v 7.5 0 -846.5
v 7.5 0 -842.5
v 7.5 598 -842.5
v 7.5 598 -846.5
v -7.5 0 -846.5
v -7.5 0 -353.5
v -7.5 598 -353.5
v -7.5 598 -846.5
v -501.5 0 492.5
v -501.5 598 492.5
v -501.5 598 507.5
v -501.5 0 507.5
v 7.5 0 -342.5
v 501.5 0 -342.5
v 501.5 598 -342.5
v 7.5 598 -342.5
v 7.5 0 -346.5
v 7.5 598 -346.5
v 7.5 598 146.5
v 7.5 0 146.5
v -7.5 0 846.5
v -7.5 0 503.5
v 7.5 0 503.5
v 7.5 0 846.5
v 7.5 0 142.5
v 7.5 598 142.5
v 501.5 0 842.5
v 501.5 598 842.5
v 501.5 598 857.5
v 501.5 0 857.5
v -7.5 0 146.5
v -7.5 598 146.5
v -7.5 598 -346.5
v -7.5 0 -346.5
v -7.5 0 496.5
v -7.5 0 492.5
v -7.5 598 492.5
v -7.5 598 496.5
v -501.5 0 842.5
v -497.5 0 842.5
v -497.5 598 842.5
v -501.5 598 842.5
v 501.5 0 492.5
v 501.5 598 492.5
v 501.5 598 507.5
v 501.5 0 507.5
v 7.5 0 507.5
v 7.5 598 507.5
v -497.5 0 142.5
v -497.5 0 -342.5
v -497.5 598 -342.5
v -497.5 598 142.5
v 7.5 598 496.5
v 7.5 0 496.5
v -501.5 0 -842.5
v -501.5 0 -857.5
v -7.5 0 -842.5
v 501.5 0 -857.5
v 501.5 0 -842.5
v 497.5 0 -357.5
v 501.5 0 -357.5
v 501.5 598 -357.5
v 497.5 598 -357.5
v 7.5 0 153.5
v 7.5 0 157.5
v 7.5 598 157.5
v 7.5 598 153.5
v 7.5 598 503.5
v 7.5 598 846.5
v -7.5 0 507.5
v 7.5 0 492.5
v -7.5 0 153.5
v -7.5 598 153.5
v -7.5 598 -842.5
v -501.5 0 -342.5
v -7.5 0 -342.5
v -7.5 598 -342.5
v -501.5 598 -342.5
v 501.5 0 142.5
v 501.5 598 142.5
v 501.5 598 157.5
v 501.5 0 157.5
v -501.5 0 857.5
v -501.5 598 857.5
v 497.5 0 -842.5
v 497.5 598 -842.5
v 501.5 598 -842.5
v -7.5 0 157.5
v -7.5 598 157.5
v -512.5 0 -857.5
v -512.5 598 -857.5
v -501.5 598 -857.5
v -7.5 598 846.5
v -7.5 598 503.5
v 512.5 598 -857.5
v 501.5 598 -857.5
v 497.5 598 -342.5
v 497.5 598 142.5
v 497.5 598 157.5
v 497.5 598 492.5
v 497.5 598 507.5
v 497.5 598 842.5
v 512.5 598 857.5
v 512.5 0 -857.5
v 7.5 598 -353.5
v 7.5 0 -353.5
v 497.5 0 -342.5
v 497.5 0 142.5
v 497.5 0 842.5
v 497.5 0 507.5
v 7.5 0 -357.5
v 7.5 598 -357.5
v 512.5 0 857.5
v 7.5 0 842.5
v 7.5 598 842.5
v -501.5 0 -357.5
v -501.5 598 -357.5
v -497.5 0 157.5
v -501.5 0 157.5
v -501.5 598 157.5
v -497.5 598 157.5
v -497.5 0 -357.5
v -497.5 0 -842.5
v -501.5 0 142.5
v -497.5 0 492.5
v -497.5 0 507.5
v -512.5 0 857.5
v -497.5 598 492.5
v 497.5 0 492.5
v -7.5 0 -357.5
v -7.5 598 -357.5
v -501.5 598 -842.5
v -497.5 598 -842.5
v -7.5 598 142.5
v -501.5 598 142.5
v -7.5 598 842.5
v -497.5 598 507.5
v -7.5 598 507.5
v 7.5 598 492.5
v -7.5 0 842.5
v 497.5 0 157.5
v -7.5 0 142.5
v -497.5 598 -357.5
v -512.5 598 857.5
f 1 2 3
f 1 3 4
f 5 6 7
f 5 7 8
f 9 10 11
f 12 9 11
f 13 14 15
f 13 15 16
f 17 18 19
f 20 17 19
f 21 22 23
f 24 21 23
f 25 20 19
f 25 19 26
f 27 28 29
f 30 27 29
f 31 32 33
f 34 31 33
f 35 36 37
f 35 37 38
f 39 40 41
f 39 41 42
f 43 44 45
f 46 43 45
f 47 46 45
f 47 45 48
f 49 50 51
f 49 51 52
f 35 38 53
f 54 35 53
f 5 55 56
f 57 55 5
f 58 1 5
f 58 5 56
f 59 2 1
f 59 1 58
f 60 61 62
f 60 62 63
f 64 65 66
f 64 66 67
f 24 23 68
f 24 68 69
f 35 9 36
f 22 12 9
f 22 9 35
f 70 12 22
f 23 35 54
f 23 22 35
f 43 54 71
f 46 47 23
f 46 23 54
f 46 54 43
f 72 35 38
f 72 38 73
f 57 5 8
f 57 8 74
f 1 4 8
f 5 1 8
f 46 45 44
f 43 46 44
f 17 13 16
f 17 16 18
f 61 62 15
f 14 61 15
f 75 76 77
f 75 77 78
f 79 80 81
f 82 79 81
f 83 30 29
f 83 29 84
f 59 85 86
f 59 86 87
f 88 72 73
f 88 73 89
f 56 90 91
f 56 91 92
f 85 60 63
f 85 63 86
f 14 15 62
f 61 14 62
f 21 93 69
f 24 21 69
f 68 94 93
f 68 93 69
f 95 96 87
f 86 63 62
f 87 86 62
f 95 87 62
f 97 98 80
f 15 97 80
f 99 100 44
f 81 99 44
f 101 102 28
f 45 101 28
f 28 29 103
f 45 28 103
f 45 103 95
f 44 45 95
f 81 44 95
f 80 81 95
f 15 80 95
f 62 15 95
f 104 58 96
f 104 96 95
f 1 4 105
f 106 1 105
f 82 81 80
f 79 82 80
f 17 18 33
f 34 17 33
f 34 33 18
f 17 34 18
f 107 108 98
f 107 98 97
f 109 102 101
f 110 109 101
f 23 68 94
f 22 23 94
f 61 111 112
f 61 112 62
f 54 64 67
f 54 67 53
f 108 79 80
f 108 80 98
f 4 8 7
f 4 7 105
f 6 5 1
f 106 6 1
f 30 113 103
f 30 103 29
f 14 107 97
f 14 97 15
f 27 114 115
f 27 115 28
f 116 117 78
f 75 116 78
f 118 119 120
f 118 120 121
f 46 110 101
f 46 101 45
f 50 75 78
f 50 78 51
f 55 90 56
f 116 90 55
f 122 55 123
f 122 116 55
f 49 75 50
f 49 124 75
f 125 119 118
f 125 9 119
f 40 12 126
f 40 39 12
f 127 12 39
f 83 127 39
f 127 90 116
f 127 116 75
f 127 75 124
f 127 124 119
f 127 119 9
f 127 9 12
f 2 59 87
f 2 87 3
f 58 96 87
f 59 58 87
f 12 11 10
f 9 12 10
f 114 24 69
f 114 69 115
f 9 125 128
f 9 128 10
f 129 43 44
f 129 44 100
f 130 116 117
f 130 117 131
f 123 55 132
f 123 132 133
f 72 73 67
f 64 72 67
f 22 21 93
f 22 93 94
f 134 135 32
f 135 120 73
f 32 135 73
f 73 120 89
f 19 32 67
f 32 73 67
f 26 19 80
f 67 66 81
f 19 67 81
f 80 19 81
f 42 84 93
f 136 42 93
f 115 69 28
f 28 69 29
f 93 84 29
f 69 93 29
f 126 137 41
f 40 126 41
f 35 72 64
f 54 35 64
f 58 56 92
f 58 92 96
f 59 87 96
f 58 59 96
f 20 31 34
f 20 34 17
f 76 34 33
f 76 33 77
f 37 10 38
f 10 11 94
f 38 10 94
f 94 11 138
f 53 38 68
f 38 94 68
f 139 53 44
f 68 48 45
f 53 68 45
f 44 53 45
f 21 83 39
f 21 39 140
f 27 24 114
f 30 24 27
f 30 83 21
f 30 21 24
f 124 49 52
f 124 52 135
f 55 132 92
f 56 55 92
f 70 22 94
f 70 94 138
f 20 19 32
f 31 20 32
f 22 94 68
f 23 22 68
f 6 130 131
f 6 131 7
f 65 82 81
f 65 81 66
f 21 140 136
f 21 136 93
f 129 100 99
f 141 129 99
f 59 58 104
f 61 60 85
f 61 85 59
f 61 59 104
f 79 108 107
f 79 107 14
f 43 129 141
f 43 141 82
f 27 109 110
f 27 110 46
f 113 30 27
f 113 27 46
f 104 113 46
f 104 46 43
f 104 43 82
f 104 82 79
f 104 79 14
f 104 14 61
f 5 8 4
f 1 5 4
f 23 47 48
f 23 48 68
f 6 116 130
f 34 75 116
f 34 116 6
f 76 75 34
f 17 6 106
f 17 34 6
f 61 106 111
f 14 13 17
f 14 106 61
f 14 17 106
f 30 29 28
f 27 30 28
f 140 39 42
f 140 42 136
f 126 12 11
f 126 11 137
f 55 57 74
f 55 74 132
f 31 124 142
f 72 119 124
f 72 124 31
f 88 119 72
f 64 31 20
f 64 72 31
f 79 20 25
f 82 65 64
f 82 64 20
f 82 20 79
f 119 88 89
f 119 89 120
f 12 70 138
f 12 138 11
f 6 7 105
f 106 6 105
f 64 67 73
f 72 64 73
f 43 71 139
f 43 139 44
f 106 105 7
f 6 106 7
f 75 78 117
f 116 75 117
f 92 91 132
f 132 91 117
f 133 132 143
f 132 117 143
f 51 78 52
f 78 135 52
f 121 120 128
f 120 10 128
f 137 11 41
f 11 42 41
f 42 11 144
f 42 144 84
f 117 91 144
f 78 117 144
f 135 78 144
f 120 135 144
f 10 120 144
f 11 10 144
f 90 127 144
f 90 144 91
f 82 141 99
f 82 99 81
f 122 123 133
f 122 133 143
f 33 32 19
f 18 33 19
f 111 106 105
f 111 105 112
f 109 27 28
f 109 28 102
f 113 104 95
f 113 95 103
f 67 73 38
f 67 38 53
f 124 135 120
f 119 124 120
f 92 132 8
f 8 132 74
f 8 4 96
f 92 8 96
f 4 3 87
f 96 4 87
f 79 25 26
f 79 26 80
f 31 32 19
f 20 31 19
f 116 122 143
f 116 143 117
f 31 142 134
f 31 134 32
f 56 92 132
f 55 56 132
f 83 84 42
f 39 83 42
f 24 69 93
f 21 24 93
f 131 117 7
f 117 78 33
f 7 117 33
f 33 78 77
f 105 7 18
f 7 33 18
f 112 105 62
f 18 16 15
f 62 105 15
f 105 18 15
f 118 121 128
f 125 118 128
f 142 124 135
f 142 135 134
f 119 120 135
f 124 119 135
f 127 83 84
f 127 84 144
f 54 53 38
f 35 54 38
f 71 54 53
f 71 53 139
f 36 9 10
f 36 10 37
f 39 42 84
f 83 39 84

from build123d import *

# Parameters (mm, degrees)
F2_DEPTH = 598
F3_DEPTH = 598
F4_DEPTH = 598
F5_DEPTH = 598
F6_DEPTH = 598
F7_DEPTH = 598
F8_DEPTH = 598


# Not quite as in the source:
# - a feature names something its author has since deleted; it is built from what else it names


with BuildPart() as f2:
    # F1 (on Front) → F2 (new body)
    with BuildSketch(Plane.XZ):
        Polygon((-501.5, 842.5), (-501.5, 857.5), (-512.5, 857.5), (-512.5, -857.5), (-501.5, -857.5), (-501.5, -842.5), (-497.5, -842.5), (-497.5, -357.5), (-501.5, -357.5), (-501.5, -342.5), (-497.5, -342.5), (-497.5, 142.5), (-501.5, 142.5), (-501.5, 157.5), (-497.5, 157.5), (-497.5, 492.5), (-501.5, 492.5), (-501.5, 507.5), (-497.5, 507.5), (-497.5, 842.5), align=None)
    extrude(amount=-F2_DEPTH)


with BuildPart() as f3:
    # F1 (on Front) → F3 (new body)
    with BuildSketch(Plane.XZ):
        Polygon((501.5, 842.5), (497.5, 842.5), (497.5, 507.5), (501.5, 507.5), (501.5, 492.5), (497.5, 492.5), (497.5, 157.5), (501.5, 157.5), (501.5, 142.5), (497.5, 142.5), (497.5, -342.5), (501.5, -342.5), (501.5, -357.5), (497.5, -357.5), (497.5, -842.5), (501.5, -842.5), (501.5, -857.5), (512.5, -857.5), (512.5, 857.5), (501.5, 857.5), align=None)
    extrude(amount=-F3_DEPTH)


with BuildPart() as f4:
    # F1 (on Front) → F4 (new body)
    with BuildSketch(Plane.XZ):
        Polygon((7.5, 842.5), (497.5, 842.5), (501.5, 842.5), (501.5, 857.5), (-501.5, 857.5), (-501.5, 842.5), (-497.5, 842.5), (-7.5, 842.5), (-7.5, 846.5), (7.5, 846.5), align=None)
    extrude(amount=-F4_DEPTH)


with BuildPart() as f4b:
    # F1 (on Front) → F4, piece 2 (new body)
    with BuildSketch(Plane.XZ):
        Polygon((-501.5, -857.5), (501.5, -857.5), (501.5, -842.5), (497.5, -842.5), (7.5, -842.5), (7.5, -846.5), (-7.5, -846.5), (-7.5, -842.5), (-497.5, -842.5), (-501.5, -842.5), align=None)
    extrude(amount=-F4_DEPTH)


with BuildPart() as f5:
    # F1 (on Front) → F5 (new body)
    with BuildSketch(Plane.XZ):
        Polygon((7.5, -357.5), (497.5, -357.5), (501.5, -357.5), (501.5, -342.5), (497.5, -342.5), (7.5, -342.5), (7.5, -346.5), (-7.5, -346.5), (-7.5, -342.5), (-497.5, -342.5), (-501.5, -342.5), (-501.5, -357.5), (-497.5, -357.5), (-7.5, -357.5), (-7.5, -353.5), (7.5, -353.5), align=None)
    extrude(amount=-F5_DEPTH)


with BuildPart() as f6:
    # F1 (on Front) → F6 (new body)
    with BuildSketch(Plane.XZ):
        Polygon((7.5, 507.5), (7.5, 842.5), (7.5, 846.5), (-7.5, 846.5), (-7.5, 842.5), (-7.5, 507.5), (-7.5, 503.5), (7.5, 503.5), align=None)
    extrude(amount=-F6_DEPTH)


with BuildPart() as f6b:
    # F1 (on Front) → F6, piece 2 (new body)
    with BuildSketch(Plane.XZ):
        Polygon((7.5, 157.5), (7.5, 492.5), (7.5, 496.5), (-7.5, 496.5), (-7.5, 492.5), (-7.5, 157.5), (-7.5, 153.5), (7.5, 153.5), align=None)
    extrude(amount=-F6_DEPTH)


with BuildPart() as f7:
    # F1 (on Front) → F7 (new body)
    with BuildSketch(Plane.XZ):
        Polygon((7.5, -846.5), (7.5, -842.5), (7.5, -357.5), (7.5, -353.5), (-7.5, -353.5), (-7.5, -357.5), (-7.5, -842.5), (-7.5, -846.5), align=None)
    extrude(amount=-F7_DEPTH)


with BuildPart() as f7b:
    # F1 (on Front) → F7, piece 2 (new body)
    with BuildSketch(Plane.XZ):
        Polygon((7.5, -342.5), (7.5, 142.5), (7.5, 146.5), (-7.5, 146.5), (-7.5, 142.5), (-7.5, -342.5), (-7.5, -346.5), (7.5, -346.5), align=None)
    extrude(amount=-F7_DEPTH)


with BuildPart() as f8:
    # F1 (on Front) → F8 (new body)
    with BuildSketch(Plane.XZ):
        Polygon((501.5, 507.5), (497.5, 507.5), (7.5, 507.5), (7.5, 503.5), (-7.5, 503.5), (-7.5, 507.5), (-497.5, 507.5), (-501.5, 507.5), (-501.5, 492.5), (-497.5, 492.5), (-7.5, 492.5), (-7.5, 496.5), (7.5, 496.5), (7.5, 492.5), (497.5, 492.5), (501.5, 492.5), align=None)
    extrude(amount=-F8_DEPTH)


with BuildPart() as f8b:
    # F1 (on Front) → F8, piece 2 (new body)
    with BuildSketch(Plane.XZ):
        Polygon((501.5, 157.5), (497.5, 157.5), (7.5, 157.5), (7.5, 153.5), (-7.5, 153.5), (-7.5, 157.5), (-497.5, 157.5), (-501.5, 157.5), (-501.5, 142.5), (-497.5, 142.5), (-7.5, 142.5), (-7.5, 146.5), (7.5, 146.5), (7.5, 142.5), (497.5, 142.5), (501.5, 142.5), align=None)
    extrude(amount=-F8_DEPTH)


solid = Compound([f2.part, f3.part, f4.part, f4b.part, f5.part, f6.part, f6b.part, f7.part, f7b.part, f8.part, f8b.part])
